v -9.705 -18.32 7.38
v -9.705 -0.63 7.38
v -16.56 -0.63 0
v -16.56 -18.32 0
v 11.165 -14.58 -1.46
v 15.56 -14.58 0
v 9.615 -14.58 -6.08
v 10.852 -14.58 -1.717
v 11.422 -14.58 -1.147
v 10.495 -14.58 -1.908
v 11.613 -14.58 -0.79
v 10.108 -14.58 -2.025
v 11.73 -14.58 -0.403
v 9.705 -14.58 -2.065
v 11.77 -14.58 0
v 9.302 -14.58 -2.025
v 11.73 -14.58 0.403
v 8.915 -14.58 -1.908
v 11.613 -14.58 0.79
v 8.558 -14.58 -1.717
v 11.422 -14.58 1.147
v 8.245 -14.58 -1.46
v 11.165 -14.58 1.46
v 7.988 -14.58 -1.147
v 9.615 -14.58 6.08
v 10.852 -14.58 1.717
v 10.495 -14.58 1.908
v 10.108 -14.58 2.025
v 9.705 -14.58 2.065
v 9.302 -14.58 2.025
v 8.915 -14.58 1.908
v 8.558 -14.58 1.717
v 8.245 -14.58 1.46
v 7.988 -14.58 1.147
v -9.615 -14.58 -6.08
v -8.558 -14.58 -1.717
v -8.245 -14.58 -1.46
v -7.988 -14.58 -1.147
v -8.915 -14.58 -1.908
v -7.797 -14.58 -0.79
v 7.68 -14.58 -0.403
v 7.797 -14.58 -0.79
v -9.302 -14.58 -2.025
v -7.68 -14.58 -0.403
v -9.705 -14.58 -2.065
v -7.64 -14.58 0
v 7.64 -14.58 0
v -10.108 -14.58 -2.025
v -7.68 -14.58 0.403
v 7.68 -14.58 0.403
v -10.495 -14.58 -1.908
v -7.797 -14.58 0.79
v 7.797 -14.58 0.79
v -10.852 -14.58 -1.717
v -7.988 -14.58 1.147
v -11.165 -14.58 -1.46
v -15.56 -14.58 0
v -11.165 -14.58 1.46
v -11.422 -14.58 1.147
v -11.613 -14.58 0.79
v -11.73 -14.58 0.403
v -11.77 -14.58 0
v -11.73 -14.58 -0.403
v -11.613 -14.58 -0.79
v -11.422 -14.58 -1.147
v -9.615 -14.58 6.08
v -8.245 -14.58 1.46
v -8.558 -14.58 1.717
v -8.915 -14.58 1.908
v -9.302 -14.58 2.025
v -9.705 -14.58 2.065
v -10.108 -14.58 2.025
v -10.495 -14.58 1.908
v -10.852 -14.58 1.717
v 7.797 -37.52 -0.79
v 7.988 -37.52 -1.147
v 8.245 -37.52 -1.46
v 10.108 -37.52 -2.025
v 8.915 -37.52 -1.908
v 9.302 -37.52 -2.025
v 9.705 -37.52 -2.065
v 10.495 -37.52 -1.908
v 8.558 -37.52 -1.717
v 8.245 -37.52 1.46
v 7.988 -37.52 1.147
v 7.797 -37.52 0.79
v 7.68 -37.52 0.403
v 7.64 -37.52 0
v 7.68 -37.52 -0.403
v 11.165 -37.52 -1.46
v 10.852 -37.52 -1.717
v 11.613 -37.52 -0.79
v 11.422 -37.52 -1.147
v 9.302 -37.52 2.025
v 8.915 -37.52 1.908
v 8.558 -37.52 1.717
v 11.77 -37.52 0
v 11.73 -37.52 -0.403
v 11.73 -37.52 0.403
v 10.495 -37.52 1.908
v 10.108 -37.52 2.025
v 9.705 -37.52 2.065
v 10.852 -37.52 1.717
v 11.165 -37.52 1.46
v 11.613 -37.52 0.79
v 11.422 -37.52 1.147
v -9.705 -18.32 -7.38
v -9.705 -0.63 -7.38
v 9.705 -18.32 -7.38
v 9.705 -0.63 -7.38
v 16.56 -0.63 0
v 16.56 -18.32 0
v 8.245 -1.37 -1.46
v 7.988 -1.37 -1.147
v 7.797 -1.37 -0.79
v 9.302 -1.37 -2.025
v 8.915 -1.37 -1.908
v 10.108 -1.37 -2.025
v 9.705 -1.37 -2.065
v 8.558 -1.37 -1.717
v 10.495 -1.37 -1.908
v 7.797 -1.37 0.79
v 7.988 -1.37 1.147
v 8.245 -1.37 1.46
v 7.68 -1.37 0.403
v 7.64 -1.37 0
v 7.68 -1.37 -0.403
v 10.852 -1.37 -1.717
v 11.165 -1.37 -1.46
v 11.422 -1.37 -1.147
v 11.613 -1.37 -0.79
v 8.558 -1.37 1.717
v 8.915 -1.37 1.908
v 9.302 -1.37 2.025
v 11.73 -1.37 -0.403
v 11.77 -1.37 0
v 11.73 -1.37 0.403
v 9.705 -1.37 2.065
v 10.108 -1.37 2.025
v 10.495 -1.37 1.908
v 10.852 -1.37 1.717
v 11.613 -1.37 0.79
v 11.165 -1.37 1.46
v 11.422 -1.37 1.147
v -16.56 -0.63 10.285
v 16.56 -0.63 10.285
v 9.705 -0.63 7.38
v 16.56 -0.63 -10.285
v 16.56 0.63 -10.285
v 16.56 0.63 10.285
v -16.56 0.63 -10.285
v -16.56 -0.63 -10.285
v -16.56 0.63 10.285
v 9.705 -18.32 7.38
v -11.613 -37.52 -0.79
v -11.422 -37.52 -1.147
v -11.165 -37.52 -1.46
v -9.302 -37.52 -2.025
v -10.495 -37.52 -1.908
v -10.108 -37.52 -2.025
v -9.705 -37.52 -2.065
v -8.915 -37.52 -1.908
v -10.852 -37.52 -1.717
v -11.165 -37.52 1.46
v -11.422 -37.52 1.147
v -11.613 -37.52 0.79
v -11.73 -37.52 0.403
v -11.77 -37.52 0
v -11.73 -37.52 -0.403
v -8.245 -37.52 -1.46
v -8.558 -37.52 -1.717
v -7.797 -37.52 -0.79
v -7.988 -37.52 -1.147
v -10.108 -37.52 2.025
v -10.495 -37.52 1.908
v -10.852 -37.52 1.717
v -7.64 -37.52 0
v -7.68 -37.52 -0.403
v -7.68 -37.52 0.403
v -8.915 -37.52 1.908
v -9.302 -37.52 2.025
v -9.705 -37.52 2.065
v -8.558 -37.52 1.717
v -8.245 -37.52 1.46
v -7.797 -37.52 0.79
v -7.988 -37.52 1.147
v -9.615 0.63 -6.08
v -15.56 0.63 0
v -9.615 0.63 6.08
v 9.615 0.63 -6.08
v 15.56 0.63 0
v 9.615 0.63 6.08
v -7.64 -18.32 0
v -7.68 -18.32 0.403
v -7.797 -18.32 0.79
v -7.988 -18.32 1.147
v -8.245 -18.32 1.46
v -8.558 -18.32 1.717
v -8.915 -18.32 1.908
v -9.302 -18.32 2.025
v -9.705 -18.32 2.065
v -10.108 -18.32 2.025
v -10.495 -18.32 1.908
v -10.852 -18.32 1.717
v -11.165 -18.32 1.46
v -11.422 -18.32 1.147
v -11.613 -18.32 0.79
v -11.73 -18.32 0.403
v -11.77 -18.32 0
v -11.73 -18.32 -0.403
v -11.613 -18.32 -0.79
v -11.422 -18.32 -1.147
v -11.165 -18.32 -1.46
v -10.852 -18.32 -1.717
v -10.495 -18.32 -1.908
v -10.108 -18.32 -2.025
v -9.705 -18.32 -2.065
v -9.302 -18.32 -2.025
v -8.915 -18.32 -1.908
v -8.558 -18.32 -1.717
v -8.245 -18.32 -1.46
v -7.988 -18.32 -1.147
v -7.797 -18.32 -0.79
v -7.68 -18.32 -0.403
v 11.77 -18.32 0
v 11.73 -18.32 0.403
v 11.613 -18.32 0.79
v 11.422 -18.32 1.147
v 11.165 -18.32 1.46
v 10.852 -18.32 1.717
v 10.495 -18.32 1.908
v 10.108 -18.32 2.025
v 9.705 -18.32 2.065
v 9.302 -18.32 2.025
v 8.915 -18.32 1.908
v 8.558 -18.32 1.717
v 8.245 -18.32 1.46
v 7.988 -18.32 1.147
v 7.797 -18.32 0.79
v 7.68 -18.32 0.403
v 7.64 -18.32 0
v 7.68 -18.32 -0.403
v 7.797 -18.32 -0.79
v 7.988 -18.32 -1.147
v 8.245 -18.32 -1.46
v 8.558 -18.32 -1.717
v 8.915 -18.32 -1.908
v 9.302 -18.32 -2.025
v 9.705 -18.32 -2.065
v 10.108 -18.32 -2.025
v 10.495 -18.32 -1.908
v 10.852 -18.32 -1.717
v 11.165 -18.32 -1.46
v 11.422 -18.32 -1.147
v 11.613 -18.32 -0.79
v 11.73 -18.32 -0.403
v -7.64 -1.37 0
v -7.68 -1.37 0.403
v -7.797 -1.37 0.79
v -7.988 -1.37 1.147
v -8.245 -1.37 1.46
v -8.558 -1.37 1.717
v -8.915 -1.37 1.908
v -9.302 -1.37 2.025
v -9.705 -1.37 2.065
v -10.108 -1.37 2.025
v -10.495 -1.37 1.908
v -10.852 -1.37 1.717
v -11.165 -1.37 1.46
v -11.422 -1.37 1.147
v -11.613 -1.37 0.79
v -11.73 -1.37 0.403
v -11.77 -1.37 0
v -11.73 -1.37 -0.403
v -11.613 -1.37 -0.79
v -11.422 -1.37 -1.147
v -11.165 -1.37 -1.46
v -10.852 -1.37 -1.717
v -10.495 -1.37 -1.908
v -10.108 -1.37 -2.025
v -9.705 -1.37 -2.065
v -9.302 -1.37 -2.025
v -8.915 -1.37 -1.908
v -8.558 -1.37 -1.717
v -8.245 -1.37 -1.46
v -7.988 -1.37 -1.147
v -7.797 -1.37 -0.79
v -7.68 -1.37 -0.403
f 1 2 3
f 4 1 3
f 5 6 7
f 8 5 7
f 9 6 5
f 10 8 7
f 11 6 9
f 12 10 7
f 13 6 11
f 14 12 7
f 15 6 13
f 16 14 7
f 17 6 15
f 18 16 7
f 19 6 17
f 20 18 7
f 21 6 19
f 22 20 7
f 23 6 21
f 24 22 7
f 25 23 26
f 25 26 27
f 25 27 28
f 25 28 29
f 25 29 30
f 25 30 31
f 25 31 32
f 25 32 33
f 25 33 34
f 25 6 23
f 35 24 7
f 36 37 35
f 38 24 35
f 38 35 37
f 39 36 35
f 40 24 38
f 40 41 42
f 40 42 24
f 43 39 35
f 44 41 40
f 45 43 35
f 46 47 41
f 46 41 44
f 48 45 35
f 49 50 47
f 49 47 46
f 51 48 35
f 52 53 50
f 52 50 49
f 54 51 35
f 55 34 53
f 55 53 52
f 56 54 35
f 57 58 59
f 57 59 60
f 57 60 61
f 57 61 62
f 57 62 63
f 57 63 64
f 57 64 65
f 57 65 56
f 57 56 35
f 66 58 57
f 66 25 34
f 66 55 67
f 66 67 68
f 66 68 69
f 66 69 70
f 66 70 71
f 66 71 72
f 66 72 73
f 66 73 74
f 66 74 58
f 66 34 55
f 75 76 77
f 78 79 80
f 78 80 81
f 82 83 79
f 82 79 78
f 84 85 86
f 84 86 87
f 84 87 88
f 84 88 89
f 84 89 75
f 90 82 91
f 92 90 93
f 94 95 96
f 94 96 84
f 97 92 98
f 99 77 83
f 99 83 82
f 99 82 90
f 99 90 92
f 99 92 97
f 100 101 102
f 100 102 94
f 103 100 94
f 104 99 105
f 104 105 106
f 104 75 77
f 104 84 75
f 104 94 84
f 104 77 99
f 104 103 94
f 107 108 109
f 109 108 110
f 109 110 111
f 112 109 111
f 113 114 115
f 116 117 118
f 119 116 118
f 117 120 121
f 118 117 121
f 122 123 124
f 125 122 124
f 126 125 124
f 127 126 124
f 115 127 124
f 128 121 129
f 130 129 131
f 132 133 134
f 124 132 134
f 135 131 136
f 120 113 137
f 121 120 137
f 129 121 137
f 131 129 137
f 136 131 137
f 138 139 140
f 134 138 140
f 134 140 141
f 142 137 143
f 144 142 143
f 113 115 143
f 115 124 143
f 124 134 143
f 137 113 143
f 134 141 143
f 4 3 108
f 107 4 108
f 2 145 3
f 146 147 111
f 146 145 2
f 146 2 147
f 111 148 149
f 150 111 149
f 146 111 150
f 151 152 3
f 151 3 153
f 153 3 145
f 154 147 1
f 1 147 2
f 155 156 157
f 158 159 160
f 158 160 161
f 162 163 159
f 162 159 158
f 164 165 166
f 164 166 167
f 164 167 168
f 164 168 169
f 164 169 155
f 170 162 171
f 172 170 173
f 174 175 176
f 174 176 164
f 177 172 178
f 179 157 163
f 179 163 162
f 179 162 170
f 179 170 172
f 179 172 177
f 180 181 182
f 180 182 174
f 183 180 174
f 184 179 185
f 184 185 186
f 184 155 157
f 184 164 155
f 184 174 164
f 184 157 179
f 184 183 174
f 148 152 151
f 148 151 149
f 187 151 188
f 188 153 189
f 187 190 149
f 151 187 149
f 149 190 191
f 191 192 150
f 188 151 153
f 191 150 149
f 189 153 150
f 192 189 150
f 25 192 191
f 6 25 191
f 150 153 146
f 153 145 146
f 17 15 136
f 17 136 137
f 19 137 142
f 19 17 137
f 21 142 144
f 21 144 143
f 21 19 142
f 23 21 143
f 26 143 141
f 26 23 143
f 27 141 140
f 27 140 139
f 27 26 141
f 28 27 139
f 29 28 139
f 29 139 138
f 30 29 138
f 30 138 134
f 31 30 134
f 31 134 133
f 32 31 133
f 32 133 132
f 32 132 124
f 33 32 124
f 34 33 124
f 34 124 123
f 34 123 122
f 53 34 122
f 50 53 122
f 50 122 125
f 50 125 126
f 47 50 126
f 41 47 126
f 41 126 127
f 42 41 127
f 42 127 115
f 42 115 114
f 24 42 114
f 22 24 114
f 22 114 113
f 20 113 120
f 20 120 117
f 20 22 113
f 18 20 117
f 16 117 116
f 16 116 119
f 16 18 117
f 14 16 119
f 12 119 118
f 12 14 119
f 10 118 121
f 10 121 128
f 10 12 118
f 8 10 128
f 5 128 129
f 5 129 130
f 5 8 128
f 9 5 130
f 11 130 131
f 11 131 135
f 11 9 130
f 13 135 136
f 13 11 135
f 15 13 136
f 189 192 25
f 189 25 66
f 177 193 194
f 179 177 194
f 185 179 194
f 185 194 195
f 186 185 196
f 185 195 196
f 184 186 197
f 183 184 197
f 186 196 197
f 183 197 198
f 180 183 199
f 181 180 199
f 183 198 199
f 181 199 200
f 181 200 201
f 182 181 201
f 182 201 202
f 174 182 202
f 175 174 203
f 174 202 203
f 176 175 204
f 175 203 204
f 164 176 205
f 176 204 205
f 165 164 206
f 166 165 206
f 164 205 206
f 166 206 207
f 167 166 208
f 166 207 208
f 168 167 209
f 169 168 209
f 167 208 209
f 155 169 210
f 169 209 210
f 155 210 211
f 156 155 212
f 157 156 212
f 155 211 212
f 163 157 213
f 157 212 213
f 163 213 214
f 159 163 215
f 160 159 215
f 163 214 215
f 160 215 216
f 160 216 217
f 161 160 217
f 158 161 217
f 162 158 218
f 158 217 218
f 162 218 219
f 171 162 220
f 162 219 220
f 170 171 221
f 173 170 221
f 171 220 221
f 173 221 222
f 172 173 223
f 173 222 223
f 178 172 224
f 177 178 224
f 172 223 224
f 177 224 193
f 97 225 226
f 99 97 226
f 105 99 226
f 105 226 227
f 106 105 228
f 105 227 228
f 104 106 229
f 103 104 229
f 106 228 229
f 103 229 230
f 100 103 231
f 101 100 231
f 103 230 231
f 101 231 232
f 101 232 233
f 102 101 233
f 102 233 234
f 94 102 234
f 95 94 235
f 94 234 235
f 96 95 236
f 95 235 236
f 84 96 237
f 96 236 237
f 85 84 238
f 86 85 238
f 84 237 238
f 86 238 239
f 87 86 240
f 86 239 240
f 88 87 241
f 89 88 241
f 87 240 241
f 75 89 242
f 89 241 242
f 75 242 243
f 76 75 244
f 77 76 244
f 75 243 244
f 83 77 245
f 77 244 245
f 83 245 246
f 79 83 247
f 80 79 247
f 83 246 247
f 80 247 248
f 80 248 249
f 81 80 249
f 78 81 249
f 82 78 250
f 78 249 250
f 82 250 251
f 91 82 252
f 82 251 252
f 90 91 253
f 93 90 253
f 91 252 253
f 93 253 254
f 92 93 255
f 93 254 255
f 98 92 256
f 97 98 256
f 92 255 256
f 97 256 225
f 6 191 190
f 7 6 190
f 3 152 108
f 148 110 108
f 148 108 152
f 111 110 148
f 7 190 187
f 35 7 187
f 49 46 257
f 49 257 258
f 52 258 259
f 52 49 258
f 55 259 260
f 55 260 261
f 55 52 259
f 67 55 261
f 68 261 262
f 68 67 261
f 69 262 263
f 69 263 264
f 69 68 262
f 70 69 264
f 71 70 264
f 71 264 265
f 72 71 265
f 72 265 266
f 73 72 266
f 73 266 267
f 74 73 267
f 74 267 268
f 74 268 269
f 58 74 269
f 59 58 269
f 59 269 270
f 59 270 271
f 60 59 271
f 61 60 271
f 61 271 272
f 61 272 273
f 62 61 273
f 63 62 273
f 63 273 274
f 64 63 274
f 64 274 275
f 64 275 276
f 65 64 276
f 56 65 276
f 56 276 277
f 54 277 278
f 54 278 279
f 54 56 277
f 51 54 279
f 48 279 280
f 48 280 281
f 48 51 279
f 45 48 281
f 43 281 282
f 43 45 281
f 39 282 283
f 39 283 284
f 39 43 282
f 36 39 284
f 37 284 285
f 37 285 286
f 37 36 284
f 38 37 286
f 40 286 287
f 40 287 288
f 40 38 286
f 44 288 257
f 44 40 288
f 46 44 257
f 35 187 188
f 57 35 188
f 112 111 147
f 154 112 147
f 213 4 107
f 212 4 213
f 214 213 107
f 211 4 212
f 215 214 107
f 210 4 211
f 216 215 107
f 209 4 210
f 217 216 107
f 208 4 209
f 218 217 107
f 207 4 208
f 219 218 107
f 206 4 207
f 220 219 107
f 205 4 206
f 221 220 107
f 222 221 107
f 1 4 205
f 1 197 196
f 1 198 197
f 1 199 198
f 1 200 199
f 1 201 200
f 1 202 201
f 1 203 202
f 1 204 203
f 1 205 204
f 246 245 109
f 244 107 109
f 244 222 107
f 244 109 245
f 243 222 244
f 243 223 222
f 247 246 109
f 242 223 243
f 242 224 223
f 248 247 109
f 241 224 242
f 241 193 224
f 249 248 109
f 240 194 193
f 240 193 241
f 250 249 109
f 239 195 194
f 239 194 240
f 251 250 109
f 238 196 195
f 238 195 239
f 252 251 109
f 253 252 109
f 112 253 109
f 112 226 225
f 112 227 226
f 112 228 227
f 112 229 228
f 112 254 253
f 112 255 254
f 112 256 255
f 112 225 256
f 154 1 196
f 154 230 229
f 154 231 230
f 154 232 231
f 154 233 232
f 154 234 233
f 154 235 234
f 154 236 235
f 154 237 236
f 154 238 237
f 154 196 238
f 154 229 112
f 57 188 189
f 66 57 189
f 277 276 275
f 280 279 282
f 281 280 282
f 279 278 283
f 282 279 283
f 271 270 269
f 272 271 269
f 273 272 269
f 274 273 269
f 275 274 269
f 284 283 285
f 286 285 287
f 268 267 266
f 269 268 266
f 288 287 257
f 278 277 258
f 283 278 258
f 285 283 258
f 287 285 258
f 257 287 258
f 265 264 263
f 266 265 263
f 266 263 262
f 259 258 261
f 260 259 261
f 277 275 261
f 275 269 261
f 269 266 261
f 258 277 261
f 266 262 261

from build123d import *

# Parameters (mm, degrees)
F0_W          = 33.12
F0_H          = 20.57
F1_DEPTH      = 0.63
F3_DEPTH      = 17.69
F4_W          = 19.23
F4_H          = 12.16
F5_DEPTH      = 15.21
F6_R          = 2.065
F7_DEPTH      = 19.2
F7_DEPTH_BACK = 16.95


with BuildPart() as f1:
    # F0 (on Front) → F1 (new body, symmetric)
    with BuildSketch(Plane.XZ):
        Rectangle(F0_W, F0_H)
    extrude(amount=F1_DEPTH, both=True)

    # F2 (on face) → F3 (join)
    with BuildSketch(Plane.XZ.offset(0.63)):
        Polygon((16.56, 0), (9.705, 7.38), (-9.705, 7.38), (-16.56, 0), (-9.705, -7.38), (9.705, -7.38), align=None)
    extrude(amount=F3_DEPTH)

    # F4 (on face) → F5 (cut)
    with BuildSketch(Plane(origin=(0, 0.63, 0), x_dir=(-1, 0, 0), z_dir=(0, 1, 0))):
        Rectangle(F4_W, F4_H)
        Polygon((15.56, 0), (9.615, 6.08), (9.615, -6.08), align=None)
        Polygon((-9.615, -6.08), (-9.615, 6.08), (-15.56, 0), align=None)
    extrude(amount=-F5_DEPTH, mode=Mode.SUBTRACT)

    # F6 (on face) → F7 (join, two sides)
    with BuildSketch(Plane.XZ.offset(18.32)) as f7_sk:
        with Locations((-9.705, 0)):
            Circle(F6_R)
        with Locations((9.705, 0)):
            Circle(F6_R)
    extrude(amount=F7_DEPTH)
    extrude(f7_sk.sketch, amount=-F7_DEPTH_BACK)


solid = f1.part
